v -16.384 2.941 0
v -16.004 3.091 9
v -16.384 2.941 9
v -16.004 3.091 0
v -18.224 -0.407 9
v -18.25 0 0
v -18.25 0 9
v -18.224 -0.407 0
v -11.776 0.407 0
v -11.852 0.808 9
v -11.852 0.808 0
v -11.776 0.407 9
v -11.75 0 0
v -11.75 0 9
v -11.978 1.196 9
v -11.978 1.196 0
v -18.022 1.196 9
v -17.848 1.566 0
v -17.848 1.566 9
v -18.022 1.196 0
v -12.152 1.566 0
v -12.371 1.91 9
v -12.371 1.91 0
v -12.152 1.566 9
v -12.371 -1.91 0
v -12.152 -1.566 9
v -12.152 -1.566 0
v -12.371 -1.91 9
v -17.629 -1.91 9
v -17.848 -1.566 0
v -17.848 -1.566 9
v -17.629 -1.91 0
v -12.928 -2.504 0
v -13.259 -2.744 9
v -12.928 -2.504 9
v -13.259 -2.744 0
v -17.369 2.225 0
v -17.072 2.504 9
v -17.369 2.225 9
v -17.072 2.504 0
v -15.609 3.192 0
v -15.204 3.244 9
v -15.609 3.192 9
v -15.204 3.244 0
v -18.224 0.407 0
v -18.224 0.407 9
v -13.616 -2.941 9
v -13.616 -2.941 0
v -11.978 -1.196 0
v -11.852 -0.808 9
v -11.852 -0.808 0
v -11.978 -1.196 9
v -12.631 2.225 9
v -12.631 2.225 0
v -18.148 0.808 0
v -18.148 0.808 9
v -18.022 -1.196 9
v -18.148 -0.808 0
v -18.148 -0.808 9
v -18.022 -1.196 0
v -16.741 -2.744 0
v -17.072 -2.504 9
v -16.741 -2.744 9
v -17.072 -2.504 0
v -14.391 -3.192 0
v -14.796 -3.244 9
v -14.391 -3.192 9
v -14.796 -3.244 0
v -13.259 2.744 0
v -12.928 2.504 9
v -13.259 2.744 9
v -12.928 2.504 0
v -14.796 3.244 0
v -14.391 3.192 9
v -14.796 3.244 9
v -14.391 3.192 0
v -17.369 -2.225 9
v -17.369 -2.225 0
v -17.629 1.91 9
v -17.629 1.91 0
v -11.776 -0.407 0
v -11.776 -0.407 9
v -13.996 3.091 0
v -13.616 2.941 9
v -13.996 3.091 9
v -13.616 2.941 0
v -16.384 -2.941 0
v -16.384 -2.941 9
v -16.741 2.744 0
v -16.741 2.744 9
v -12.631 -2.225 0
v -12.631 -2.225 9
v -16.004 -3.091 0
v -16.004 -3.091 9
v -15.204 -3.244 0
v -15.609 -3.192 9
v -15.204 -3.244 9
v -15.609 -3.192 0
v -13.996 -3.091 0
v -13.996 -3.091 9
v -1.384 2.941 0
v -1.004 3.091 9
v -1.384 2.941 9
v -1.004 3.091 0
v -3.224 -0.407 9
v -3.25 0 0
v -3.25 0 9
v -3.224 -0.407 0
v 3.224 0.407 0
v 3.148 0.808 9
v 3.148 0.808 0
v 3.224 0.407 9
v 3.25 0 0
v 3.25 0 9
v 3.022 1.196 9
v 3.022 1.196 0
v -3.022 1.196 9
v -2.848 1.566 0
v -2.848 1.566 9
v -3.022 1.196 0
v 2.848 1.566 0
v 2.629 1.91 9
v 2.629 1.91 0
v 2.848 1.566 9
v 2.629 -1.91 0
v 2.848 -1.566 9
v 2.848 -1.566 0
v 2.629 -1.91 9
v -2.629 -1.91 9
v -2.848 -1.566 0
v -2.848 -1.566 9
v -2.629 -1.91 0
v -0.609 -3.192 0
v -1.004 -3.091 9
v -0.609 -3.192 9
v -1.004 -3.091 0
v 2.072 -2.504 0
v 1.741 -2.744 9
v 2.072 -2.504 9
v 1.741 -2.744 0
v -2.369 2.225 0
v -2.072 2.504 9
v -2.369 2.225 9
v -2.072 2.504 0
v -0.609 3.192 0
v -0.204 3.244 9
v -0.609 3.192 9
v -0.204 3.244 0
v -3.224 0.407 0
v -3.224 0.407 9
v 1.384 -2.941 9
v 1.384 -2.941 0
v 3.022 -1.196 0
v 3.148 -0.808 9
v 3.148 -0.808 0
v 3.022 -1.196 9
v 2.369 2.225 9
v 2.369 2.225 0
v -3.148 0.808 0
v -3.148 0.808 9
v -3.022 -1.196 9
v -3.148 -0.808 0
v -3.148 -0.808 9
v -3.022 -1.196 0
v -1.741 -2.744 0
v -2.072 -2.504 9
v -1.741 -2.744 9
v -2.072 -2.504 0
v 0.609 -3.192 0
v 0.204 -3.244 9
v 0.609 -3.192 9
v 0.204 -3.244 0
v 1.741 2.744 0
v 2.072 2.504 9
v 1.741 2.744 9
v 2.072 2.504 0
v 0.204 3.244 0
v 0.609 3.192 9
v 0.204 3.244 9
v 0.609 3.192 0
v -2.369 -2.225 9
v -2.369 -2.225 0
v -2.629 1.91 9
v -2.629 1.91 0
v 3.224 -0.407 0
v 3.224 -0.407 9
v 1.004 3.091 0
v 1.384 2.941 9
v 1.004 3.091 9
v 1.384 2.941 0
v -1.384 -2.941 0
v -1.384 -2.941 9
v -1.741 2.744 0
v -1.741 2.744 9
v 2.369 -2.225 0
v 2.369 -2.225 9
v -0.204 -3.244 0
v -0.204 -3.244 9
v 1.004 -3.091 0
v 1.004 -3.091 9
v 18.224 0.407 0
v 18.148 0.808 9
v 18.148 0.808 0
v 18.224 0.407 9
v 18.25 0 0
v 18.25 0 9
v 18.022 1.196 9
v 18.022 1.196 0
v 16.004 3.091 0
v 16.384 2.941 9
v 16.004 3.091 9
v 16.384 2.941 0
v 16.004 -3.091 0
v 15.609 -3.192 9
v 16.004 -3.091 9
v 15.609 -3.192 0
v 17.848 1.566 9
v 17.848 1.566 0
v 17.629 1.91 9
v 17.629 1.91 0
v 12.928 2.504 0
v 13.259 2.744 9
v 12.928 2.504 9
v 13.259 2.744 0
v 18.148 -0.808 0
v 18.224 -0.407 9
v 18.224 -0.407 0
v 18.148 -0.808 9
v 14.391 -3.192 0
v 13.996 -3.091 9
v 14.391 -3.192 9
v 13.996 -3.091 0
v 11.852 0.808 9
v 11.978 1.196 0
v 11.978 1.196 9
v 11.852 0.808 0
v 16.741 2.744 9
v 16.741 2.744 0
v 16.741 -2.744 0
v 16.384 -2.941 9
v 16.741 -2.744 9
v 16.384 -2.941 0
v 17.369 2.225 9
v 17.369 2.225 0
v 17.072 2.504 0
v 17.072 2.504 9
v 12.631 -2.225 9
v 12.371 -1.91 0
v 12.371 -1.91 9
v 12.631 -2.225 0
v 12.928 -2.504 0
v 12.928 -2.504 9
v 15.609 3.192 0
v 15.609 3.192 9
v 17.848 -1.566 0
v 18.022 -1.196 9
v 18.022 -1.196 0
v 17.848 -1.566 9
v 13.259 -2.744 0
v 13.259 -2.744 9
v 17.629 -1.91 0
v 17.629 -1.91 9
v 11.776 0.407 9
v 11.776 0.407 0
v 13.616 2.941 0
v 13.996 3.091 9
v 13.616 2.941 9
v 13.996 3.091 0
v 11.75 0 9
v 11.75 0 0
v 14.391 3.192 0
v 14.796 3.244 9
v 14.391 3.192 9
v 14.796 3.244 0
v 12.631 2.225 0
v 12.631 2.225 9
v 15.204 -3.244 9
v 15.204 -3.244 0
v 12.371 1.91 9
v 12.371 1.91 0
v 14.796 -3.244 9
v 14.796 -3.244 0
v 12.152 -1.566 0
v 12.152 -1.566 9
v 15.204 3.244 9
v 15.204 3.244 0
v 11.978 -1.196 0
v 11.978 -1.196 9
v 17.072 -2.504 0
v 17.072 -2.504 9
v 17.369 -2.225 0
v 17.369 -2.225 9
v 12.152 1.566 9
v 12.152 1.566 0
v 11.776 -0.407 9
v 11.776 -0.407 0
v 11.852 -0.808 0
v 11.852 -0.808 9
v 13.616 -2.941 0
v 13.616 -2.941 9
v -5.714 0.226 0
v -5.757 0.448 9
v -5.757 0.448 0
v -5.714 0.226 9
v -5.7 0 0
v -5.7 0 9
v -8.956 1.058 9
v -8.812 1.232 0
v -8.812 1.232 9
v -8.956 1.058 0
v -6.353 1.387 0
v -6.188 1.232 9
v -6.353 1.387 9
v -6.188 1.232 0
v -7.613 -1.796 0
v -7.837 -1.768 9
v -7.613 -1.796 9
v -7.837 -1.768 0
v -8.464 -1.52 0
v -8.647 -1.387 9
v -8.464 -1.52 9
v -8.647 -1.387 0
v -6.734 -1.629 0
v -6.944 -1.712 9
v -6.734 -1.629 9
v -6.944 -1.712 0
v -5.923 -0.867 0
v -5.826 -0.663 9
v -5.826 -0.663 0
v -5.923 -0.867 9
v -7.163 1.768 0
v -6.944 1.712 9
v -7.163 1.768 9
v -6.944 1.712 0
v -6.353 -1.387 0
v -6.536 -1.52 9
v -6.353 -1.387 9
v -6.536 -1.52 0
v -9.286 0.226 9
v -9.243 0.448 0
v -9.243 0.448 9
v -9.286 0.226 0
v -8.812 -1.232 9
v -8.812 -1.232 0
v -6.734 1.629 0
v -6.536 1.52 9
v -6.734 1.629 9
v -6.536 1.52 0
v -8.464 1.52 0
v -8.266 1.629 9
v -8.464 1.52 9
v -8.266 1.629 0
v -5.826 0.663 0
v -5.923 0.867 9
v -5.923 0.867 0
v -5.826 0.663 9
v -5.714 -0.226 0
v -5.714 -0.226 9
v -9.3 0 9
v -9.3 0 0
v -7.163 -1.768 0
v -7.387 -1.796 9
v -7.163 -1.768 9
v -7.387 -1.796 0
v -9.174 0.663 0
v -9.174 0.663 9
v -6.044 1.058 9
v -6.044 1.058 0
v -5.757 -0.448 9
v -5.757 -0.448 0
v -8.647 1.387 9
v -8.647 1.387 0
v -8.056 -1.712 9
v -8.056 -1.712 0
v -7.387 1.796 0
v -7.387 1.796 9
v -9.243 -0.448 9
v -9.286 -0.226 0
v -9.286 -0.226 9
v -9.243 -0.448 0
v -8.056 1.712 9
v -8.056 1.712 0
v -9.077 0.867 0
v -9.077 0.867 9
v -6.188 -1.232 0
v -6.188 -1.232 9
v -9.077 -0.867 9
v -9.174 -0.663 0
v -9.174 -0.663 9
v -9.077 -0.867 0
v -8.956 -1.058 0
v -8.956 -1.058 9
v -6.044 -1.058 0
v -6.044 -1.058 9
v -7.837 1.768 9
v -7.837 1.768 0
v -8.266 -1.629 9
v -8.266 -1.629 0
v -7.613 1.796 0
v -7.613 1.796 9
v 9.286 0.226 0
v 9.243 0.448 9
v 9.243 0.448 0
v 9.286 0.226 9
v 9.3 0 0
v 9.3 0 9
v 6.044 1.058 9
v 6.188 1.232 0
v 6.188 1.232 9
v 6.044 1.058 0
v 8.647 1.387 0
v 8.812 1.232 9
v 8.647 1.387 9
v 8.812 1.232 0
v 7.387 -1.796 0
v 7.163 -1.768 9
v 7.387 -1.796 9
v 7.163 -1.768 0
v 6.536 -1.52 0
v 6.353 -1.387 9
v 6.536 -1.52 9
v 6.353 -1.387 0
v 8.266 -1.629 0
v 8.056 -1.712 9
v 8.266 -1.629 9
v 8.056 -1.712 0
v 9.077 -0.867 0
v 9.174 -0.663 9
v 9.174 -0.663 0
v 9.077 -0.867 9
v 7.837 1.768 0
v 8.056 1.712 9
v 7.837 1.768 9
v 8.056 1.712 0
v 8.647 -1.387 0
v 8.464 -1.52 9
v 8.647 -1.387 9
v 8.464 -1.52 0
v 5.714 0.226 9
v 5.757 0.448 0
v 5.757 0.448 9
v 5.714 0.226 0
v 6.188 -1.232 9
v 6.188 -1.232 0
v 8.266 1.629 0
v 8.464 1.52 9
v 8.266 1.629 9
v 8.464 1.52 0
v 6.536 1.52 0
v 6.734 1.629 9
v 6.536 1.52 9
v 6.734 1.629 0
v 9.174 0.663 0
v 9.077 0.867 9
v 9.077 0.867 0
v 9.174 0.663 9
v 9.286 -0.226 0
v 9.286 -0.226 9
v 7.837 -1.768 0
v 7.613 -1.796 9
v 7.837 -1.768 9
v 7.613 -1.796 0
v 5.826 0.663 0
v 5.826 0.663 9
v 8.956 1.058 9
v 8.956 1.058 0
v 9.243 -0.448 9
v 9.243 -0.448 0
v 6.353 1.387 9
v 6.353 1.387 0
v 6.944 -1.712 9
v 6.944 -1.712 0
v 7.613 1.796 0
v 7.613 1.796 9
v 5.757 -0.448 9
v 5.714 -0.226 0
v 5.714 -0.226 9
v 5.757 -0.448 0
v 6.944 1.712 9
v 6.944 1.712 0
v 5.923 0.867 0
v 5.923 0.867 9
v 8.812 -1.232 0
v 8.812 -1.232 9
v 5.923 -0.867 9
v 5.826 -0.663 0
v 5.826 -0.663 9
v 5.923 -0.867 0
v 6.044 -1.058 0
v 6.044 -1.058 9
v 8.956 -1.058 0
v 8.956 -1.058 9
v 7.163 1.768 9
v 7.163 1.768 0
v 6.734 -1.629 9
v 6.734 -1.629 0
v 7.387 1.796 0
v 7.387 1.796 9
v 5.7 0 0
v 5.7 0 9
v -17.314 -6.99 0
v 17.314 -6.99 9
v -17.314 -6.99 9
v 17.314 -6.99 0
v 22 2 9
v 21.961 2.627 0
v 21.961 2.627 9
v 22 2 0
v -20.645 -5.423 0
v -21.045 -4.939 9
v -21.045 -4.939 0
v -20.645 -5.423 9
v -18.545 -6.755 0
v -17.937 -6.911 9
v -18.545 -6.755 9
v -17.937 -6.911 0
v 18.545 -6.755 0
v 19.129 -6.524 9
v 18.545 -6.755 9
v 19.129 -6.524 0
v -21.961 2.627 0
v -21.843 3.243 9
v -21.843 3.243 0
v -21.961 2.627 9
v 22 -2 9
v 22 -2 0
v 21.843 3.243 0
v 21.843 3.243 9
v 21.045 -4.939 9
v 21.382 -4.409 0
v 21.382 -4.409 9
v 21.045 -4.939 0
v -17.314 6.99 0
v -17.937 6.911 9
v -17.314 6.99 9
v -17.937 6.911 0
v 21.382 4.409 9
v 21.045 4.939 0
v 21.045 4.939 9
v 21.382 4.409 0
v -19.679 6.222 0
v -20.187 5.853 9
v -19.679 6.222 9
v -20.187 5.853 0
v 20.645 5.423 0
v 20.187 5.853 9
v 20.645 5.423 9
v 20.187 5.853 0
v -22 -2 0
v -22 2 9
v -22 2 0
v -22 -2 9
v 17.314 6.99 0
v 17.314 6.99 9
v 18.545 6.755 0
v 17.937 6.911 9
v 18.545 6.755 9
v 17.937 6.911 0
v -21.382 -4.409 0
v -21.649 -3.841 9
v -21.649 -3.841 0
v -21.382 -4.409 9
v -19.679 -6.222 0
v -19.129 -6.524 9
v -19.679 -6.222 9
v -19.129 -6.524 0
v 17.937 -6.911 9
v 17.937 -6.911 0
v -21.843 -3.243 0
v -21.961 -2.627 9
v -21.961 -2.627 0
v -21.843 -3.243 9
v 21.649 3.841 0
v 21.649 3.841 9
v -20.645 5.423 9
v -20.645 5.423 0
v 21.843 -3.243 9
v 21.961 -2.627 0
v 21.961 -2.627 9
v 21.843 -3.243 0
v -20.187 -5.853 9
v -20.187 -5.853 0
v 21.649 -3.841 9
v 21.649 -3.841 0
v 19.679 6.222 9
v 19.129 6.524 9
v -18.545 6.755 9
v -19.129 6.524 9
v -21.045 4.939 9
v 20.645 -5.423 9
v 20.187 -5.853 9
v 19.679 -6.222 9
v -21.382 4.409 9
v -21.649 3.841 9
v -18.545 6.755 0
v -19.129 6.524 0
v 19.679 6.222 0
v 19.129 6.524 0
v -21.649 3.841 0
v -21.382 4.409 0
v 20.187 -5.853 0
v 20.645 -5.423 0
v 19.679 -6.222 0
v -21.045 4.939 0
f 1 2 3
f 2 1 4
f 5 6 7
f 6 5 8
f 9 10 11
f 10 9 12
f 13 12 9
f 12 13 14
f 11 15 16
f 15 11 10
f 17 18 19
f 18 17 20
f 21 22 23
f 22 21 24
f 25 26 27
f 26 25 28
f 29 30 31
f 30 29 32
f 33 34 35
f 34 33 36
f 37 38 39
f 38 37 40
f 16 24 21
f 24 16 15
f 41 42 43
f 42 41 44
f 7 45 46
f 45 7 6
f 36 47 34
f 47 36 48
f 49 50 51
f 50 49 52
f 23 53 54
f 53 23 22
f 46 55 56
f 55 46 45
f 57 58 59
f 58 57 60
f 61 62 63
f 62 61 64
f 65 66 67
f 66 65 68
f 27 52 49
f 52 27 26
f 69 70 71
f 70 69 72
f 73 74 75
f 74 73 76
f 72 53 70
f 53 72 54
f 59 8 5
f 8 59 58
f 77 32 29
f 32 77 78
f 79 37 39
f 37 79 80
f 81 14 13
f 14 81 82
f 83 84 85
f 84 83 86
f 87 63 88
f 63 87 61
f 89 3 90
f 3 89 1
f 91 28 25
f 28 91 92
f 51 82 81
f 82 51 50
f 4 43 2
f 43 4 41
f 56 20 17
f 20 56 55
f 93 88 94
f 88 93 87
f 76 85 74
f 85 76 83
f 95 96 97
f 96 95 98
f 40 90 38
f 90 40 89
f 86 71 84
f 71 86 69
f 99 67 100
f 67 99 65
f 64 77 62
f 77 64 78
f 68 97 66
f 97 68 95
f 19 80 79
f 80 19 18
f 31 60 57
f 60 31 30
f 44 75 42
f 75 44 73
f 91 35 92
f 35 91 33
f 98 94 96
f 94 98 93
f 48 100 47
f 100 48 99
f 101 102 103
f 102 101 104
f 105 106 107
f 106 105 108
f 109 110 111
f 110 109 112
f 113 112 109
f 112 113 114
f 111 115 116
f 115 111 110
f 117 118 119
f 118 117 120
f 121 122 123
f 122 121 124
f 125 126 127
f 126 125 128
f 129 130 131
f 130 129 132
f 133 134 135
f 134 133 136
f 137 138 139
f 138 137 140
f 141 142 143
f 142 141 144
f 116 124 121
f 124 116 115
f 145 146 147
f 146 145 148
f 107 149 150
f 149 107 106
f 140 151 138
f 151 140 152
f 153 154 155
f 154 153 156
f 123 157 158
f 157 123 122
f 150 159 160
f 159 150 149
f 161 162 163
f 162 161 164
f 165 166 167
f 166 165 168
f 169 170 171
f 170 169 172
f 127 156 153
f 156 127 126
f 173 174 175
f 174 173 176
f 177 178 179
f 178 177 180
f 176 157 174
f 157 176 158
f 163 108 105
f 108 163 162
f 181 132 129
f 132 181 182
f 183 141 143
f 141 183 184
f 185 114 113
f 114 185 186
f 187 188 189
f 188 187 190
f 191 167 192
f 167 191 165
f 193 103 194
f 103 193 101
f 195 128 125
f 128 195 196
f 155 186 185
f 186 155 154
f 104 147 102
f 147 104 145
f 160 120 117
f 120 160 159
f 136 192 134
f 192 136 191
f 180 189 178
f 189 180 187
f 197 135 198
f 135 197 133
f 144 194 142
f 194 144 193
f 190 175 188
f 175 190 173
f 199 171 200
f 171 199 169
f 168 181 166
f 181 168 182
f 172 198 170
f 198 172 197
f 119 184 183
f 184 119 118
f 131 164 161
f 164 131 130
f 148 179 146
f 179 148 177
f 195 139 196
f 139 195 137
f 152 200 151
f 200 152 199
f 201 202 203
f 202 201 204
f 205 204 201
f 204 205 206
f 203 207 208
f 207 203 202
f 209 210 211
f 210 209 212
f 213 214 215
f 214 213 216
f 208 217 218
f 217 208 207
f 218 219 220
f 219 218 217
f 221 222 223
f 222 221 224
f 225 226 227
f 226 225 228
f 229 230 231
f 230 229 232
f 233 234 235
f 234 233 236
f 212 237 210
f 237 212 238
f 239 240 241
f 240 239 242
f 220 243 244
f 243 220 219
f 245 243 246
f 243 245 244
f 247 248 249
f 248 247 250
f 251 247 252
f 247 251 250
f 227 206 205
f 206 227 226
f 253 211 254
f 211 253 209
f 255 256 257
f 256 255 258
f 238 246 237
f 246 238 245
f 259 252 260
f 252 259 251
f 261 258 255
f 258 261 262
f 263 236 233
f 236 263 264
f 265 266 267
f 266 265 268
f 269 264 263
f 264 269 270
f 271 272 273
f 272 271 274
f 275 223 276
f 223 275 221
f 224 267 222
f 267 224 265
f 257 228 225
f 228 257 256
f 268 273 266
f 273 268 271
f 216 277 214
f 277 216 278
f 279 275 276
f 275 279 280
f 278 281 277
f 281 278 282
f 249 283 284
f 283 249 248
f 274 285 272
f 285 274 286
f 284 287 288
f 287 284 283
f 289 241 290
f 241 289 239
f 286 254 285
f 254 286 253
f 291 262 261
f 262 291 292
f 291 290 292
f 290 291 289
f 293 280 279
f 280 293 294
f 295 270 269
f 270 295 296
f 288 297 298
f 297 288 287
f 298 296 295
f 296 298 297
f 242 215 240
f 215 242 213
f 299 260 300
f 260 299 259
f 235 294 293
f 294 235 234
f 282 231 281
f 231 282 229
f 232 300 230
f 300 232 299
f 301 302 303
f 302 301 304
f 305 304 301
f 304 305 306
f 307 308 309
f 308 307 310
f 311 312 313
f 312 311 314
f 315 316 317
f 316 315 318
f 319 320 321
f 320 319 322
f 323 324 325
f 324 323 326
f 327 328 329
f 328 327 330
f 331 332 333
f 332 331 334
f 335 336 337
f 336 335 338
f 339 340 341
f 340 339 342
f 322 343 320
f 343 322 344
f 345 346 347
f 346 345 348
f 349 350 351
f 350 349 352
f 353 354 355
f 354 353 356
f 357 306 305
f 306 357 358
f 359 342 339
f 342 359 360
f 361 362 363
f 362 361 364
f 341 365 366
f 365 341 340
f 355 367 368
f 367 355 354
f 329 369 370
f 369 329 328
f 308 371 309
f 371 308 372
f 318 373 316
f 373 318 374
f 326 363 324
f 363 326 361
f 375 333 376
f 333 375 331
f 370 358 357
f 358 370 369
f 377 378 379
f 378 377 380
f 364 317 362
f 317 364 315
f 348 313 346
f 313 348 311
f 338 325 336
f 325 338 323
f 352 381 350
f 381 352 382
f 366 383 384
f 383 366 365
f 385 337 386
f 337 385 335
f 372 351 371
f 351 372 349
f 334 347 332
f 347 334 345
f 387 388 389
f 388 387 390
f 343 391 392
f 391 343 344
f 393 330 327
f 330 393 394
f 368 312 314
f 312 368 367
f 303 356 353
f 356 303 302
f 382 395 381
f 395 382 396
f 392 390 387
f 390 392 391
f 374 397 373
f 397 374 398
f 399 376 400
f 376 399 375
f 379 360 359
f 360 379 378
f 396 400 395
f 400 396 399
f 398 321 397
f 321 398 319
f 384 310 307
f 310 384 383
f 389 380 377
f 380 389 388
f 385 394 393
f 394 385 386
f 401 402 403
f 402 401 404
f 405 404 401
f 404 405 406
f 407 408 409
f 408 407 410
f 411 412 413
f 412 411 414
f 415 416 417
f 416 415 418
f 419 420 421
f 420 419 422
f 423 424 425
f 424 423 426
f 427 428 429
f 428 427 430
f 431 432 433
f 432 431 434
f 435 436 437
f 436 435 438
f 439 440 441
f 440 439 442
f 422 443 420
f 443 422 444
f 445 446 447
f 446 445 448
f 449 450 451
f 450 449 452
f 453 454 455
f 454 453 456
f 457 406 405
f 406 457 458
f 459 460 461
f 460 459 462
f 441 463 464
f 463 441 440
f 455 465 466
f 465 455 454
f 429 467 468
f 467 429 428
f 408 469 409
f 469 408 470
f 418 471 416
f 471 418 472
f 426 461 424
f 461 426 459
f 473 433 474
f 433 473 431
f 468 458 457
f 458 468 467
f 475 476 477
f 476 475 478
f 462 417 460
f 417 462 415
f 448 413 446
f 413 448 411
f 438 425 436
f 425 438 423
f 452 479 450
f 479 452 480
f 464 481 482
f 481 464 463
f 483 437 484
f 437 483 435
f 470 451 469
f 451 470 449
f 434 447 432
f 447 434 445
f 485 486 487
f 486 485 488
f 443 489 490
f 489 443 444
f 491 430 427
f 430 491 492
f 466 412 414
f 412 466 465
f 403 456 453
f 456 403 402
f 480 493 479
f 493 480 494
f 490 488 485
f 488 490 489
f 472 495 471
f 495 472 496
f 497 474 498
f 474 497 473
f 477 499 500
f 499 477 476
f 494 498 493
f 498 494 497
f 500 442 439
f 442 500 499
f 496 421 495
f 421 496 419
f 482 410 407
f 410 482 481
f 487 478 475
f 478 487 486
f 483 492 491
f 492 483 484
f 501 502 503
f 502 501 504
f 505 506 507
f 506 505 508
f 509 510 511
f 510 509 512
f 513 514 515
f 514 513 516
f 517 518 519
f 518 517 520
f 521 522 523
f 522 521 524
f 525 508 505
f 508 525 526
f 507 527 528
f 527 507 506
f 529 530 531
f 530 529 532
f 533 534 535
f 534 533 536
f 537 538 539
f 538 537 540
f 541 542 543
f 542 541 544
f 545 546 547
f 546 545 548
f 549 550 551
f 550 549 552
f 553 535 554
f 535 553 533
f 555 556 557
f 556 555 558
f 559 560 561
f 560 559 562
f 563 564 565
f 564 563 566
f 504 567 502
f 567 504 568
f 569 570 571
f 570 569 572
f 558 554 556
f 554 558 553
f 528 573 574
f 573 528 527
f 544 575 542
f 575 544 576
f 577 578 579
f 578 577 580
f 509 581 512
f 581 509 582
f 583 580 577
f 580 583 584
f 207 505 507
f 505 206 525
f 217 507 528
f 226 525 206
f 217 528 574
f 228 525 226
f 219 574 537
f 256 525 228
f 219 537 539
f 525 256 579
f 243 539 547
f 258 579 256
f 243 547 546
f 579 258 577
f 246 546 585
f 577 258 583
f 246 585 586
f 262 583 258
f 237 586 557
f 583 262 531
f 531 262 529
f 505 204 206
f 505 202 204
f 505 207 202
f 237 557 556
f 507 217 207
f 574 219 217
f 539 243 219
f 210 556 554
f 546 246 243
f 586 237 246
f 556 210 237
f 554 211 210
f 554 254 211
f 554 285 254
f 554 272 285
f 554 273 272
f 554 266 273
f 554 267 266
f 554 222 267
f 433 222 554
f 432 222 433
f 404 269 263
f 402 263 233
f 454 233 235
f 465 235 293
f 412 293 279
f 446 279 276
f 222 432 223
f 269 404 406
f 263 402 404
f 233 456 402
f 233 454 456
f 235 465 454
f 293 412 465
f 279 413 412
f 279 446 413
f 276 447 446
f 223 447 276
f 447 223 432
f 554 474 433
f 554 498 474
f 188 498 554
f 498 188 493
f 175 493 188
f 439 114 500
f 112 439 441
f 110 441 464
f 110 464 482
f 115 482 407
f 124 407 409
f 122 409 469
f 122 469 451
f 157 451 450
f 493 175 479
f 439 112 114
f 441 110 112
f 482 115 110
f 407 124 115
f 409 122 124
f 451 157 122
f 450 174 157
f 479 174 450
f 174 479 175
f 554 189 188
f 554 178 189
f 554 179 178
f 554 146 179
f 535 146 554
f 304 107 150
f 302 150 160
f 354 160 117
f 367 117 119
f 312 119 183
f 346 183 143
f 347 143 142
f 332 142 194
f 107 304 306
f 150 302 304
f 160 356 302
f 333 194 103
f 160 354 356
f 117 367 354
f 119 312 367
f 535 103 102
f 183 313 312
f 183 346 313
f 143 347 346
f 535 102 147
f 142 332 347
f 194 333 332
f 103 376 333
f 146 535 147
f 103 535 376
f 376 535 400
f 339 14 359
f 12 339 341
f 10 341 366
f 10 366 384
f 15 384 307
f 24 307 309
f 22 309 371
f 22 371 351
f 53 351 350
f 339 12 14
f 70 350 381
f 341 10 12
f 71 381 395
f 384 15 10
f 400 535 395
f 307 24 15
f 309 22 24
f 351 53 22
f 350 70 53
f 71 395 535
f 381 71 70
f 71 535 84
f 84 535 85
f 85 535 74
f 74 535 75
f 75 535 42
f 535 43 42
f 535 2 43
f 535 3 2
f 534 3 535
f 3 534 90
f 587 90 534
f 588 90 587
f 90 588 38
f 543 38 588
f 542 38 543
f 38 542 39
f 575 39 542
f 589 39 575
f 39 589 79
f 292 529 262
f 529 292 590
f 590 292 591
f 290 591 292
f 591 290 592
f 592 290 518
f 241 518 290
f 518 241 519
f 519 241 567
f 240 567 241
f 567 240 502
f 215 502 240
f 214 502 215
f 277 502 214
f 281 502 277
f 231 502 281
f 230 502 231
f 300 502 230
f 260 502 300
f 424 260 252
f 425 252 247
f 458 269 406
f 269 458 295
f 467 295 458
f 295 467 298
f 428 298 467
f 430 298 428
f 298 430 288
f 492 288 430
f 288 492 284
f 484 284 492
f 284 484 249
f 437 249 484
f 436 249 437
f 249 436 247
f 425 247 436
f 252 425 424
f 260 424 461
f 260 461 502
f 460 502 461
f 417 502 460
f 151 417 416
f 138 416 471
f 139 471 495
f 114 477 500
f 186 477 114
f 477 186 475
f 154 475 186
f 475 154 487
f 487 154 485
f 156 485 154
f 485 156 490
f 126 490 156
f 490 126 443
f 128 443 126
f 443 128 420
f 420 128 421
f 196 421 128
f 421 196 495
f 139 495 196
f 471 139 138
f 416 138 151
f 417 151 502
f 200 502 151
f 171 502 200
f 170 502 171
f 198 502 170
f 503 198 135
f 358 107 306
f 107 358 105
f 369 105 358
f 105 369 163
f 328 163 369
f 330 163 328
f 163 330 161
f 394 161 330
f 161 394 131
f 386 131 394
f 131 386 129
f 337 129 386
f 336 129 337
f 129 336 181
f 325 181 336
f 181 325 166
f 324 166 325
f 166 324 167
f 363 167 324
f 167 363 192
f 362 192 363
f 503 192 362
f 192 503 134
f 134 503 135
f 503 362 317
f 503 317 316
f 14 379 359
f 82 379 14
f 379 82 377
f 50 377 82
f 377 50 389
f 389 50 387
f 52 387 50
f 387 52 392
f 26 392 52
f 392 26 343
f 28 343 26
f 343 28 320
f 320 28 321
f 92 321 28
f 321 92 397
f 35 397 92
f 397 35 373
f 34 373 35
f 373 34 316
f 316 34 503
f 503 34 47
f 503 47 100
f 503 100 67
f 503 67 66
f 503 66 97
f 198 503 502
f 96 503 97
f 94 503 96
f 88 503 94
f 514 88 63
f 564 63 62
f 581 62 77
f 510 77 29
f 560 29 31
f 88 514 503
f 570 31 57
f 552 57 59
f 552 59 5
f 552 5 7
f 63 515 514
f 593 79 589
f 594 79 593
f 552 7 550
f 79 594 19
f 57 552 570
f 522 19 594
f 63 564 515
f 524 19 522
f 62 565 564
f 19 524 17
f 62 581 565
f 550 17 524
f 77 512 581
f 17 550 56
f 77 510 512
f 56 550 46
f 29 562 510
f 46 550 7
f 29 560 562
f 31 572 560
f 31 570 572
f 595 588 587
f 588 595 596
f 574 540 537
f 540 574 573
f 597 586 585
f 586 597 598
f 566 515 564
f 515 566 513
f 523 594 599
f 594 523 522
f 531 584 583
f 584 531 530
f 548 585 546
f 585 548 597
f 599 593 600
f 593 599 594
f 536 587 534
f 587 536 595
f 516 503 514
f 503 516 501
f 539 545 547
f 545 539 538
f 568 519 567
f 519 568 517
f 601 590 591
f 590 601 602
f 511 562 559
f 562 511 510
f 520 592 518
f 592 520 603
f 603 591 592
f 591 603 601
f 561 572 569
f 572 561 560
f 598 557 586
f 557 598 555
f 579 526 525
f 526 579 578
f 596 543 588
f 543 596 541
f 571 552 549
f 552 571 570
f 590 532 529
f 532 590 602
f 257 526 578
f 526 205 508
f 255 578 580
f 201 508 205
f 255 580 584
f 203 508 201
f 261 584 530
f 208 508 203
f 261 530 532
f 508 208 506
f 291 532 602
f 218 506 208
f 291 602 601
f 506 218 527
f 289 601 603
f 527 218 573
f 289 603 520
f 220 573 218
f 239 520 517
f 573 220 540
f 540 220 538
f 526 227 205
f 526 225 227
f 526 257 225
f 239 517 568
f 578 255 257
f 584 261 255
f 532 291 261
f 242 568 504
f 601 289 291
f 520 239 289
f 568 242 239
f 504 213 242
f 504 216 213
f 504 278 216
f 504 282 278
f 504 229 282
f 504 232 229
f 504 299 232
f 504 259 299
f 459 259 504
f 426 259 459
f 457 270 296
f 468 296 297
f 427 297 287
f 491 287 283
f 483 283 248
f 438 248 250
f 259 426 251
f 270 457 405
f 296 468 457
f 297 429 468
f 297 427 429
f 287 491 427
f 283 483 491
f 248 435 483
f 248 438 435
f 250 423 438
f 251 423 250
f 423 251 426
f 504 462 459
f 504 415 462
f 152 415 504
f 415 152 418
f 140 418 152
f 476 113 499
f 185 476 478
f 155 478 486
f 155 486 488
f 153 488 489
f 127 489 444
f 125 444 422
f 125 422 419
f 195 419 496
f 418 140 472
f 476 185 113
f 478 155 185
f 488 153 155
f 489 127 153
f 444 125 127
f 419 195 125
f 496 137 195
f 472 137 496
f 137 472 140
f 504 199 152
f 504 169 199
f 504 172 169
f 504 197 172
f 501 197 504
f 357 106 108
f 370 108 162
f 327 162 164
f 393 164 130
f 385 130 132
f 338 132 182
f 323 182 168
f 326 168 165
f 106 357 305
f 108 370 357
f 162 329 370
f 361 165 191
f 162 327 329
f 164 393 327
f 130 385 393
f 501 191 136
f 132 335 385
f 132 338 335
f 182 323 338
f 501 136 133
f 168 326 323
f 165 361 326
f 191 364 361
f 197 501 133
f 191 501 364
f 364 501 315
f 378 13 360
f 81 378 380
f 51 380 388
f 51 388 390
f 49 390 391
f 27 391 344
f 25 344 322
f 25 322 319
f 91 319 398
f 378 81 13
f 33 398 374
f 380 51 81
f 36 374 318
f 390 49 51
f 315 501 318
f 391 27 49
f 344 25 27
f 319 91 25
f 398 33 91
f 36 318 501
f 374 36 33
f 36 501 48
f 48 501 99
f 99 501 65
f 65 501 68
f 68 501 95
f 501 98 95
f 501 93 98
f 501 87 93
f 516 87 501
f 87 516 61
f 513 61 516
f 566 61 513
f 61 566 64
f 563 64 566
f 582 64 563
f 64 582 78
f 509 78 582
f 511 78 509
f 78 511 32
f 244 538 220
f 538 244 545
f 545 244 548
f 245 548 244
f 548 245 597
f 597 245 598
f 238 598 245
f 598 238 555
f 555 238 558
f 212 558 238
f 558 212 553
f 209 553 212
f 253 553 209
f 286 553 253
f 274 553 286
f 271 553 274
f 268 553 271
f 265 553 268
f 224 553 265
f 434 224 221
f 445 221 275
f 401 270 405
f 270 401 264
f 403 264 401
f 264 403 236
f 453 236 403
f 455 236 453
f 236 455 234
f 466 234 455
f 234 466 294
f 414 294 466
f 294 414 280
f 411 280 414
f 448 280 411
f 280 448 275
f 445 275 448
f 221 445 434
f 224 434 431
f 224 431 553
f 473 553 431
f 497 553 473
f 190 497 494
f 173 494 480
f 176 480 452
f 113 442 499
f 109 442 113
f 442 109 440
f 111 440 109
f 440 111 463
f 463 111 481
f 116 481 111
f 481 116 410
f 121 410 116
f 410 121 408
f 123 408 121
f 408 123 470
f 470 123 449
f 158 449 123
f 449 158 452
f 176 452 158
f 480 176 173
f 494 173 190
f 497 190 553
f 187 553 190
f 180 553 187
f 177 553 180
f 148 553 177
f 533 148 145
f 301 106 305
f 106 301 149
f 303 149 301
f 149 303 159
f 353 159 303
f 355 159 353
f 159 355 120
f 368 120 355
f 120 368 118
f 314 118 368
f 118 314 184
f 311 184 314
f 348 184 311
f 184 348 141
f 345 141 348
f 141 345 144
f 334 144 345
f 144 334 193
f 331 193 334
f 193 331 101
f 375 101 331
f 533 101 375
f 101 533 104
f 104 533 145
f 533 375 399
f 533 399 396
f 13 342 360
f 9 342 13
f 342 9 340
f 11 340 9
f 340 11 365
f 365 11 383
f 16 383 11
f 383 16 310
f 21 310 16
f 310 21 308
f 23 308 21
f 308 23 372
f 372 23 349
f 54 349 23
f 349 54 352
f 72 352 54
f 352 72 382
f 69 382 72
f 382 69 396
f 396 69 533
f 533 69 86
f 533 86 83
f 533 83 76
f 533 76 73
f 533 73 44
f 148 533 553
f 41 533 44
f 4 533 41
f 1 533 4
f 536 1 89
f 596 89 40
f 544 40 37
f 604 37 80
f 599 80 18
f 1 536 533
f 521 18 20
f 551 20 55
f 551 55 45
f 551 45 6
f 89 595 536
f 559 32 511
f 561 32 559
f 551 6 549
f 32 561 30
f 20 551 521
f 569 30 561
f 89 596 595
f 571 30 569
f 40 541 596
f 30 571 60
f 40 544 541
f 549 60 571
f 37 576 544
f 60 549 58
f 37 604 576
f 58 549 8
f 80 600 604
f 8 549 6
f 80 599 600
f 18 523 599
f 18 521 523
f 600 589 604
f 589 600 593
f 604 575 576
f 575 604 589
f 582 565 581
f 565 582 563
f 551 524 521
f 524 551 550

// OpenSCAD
$fn = 50;


difference() {
	union() {
		*color(alpha = 1.0000000000, c = "gray") {
			translate(v = [0, 7, 0]) {
				linear_extrude(height = 1) {
					text(font = "Arial:style=Bold", halign = "center", size = 4.5000000000, text = "COMMENT plate main", valign = "center");
				}
			}
		}
		hull() {
			translate(v = [-17.0000000000, 2.0000000000, 0]) {
				cylinder(h = 9, r = 5);
			}
			translate(v = [17.0000000000, 2.0000000000, 0]) {
				cylinder(h = 9, r = 5);
			}
			translate(v = [-17.0000000000, -2.0000000000, 0]) {
				cylinder(h = 9, r = 5);
			}
			translate(v = [17.0000000000, -2.0000000000, 0]) {
				cylinder(h = 9, r = 5);
			}
		}
	}
	union() {
		*color(alpha = 1.0000000000, c = "gray") {
			translate(v = [0, 7, 0]) {
				linear_extrude(height = 1) {
					text(font = "Arial:style=Bold", halign = "center", size = 4.5000000000, text = "COMMENT holes main", valign = "center");
				}
			}
		}
		translate(v = [-15.0000000000, 0.0000000000, 0]) {
			translate(v = [0, 0, -100]) {
				cylinder(h = 200, r = 3.2500000000);
			}
		}
		translate(v = [0, 0, -100]) {
			cylinder(h = 200, r = 3.2500000000);
		}
		translate(v = [15.0000000000, 0.0000000000, 0]) {
			translate(v = [0, 0, -100]) {
				cylinder(h = 200, r = 3.2500000000);
			}
		}
		translate(v = [-15.0000000000, 0.0000000000, 0]) {
			translate(v = [0, 0, -100]) {
				cylinder(h = 200, r = 1.8000000000);
			}
		}
		translate(v = [-7.5000000000, 0.0000000000, 0]) {
			translate(v = [0, 0, -100]) {
				cylinder(h = 200, r = 1.8000000000);
			}
		}
		translate(v = [0, 0, -100]) {
			cylinder(h = 200, r = 1.8000000000);
		}
		translate(v = [7.5000000000, 0.0000000000, 0]) {
			translate(v = [0, 0, -100]) {
				cylinder(h = 200, r = 1.8000000000);
			}
		}
		translate(v = [15.0000000000, 0.0000000000, 0]) {
			translate(v = [0, 0, -100]) {
				cylinder(h = 200, r = 1.8000000000);
			}
		}
	}
}
